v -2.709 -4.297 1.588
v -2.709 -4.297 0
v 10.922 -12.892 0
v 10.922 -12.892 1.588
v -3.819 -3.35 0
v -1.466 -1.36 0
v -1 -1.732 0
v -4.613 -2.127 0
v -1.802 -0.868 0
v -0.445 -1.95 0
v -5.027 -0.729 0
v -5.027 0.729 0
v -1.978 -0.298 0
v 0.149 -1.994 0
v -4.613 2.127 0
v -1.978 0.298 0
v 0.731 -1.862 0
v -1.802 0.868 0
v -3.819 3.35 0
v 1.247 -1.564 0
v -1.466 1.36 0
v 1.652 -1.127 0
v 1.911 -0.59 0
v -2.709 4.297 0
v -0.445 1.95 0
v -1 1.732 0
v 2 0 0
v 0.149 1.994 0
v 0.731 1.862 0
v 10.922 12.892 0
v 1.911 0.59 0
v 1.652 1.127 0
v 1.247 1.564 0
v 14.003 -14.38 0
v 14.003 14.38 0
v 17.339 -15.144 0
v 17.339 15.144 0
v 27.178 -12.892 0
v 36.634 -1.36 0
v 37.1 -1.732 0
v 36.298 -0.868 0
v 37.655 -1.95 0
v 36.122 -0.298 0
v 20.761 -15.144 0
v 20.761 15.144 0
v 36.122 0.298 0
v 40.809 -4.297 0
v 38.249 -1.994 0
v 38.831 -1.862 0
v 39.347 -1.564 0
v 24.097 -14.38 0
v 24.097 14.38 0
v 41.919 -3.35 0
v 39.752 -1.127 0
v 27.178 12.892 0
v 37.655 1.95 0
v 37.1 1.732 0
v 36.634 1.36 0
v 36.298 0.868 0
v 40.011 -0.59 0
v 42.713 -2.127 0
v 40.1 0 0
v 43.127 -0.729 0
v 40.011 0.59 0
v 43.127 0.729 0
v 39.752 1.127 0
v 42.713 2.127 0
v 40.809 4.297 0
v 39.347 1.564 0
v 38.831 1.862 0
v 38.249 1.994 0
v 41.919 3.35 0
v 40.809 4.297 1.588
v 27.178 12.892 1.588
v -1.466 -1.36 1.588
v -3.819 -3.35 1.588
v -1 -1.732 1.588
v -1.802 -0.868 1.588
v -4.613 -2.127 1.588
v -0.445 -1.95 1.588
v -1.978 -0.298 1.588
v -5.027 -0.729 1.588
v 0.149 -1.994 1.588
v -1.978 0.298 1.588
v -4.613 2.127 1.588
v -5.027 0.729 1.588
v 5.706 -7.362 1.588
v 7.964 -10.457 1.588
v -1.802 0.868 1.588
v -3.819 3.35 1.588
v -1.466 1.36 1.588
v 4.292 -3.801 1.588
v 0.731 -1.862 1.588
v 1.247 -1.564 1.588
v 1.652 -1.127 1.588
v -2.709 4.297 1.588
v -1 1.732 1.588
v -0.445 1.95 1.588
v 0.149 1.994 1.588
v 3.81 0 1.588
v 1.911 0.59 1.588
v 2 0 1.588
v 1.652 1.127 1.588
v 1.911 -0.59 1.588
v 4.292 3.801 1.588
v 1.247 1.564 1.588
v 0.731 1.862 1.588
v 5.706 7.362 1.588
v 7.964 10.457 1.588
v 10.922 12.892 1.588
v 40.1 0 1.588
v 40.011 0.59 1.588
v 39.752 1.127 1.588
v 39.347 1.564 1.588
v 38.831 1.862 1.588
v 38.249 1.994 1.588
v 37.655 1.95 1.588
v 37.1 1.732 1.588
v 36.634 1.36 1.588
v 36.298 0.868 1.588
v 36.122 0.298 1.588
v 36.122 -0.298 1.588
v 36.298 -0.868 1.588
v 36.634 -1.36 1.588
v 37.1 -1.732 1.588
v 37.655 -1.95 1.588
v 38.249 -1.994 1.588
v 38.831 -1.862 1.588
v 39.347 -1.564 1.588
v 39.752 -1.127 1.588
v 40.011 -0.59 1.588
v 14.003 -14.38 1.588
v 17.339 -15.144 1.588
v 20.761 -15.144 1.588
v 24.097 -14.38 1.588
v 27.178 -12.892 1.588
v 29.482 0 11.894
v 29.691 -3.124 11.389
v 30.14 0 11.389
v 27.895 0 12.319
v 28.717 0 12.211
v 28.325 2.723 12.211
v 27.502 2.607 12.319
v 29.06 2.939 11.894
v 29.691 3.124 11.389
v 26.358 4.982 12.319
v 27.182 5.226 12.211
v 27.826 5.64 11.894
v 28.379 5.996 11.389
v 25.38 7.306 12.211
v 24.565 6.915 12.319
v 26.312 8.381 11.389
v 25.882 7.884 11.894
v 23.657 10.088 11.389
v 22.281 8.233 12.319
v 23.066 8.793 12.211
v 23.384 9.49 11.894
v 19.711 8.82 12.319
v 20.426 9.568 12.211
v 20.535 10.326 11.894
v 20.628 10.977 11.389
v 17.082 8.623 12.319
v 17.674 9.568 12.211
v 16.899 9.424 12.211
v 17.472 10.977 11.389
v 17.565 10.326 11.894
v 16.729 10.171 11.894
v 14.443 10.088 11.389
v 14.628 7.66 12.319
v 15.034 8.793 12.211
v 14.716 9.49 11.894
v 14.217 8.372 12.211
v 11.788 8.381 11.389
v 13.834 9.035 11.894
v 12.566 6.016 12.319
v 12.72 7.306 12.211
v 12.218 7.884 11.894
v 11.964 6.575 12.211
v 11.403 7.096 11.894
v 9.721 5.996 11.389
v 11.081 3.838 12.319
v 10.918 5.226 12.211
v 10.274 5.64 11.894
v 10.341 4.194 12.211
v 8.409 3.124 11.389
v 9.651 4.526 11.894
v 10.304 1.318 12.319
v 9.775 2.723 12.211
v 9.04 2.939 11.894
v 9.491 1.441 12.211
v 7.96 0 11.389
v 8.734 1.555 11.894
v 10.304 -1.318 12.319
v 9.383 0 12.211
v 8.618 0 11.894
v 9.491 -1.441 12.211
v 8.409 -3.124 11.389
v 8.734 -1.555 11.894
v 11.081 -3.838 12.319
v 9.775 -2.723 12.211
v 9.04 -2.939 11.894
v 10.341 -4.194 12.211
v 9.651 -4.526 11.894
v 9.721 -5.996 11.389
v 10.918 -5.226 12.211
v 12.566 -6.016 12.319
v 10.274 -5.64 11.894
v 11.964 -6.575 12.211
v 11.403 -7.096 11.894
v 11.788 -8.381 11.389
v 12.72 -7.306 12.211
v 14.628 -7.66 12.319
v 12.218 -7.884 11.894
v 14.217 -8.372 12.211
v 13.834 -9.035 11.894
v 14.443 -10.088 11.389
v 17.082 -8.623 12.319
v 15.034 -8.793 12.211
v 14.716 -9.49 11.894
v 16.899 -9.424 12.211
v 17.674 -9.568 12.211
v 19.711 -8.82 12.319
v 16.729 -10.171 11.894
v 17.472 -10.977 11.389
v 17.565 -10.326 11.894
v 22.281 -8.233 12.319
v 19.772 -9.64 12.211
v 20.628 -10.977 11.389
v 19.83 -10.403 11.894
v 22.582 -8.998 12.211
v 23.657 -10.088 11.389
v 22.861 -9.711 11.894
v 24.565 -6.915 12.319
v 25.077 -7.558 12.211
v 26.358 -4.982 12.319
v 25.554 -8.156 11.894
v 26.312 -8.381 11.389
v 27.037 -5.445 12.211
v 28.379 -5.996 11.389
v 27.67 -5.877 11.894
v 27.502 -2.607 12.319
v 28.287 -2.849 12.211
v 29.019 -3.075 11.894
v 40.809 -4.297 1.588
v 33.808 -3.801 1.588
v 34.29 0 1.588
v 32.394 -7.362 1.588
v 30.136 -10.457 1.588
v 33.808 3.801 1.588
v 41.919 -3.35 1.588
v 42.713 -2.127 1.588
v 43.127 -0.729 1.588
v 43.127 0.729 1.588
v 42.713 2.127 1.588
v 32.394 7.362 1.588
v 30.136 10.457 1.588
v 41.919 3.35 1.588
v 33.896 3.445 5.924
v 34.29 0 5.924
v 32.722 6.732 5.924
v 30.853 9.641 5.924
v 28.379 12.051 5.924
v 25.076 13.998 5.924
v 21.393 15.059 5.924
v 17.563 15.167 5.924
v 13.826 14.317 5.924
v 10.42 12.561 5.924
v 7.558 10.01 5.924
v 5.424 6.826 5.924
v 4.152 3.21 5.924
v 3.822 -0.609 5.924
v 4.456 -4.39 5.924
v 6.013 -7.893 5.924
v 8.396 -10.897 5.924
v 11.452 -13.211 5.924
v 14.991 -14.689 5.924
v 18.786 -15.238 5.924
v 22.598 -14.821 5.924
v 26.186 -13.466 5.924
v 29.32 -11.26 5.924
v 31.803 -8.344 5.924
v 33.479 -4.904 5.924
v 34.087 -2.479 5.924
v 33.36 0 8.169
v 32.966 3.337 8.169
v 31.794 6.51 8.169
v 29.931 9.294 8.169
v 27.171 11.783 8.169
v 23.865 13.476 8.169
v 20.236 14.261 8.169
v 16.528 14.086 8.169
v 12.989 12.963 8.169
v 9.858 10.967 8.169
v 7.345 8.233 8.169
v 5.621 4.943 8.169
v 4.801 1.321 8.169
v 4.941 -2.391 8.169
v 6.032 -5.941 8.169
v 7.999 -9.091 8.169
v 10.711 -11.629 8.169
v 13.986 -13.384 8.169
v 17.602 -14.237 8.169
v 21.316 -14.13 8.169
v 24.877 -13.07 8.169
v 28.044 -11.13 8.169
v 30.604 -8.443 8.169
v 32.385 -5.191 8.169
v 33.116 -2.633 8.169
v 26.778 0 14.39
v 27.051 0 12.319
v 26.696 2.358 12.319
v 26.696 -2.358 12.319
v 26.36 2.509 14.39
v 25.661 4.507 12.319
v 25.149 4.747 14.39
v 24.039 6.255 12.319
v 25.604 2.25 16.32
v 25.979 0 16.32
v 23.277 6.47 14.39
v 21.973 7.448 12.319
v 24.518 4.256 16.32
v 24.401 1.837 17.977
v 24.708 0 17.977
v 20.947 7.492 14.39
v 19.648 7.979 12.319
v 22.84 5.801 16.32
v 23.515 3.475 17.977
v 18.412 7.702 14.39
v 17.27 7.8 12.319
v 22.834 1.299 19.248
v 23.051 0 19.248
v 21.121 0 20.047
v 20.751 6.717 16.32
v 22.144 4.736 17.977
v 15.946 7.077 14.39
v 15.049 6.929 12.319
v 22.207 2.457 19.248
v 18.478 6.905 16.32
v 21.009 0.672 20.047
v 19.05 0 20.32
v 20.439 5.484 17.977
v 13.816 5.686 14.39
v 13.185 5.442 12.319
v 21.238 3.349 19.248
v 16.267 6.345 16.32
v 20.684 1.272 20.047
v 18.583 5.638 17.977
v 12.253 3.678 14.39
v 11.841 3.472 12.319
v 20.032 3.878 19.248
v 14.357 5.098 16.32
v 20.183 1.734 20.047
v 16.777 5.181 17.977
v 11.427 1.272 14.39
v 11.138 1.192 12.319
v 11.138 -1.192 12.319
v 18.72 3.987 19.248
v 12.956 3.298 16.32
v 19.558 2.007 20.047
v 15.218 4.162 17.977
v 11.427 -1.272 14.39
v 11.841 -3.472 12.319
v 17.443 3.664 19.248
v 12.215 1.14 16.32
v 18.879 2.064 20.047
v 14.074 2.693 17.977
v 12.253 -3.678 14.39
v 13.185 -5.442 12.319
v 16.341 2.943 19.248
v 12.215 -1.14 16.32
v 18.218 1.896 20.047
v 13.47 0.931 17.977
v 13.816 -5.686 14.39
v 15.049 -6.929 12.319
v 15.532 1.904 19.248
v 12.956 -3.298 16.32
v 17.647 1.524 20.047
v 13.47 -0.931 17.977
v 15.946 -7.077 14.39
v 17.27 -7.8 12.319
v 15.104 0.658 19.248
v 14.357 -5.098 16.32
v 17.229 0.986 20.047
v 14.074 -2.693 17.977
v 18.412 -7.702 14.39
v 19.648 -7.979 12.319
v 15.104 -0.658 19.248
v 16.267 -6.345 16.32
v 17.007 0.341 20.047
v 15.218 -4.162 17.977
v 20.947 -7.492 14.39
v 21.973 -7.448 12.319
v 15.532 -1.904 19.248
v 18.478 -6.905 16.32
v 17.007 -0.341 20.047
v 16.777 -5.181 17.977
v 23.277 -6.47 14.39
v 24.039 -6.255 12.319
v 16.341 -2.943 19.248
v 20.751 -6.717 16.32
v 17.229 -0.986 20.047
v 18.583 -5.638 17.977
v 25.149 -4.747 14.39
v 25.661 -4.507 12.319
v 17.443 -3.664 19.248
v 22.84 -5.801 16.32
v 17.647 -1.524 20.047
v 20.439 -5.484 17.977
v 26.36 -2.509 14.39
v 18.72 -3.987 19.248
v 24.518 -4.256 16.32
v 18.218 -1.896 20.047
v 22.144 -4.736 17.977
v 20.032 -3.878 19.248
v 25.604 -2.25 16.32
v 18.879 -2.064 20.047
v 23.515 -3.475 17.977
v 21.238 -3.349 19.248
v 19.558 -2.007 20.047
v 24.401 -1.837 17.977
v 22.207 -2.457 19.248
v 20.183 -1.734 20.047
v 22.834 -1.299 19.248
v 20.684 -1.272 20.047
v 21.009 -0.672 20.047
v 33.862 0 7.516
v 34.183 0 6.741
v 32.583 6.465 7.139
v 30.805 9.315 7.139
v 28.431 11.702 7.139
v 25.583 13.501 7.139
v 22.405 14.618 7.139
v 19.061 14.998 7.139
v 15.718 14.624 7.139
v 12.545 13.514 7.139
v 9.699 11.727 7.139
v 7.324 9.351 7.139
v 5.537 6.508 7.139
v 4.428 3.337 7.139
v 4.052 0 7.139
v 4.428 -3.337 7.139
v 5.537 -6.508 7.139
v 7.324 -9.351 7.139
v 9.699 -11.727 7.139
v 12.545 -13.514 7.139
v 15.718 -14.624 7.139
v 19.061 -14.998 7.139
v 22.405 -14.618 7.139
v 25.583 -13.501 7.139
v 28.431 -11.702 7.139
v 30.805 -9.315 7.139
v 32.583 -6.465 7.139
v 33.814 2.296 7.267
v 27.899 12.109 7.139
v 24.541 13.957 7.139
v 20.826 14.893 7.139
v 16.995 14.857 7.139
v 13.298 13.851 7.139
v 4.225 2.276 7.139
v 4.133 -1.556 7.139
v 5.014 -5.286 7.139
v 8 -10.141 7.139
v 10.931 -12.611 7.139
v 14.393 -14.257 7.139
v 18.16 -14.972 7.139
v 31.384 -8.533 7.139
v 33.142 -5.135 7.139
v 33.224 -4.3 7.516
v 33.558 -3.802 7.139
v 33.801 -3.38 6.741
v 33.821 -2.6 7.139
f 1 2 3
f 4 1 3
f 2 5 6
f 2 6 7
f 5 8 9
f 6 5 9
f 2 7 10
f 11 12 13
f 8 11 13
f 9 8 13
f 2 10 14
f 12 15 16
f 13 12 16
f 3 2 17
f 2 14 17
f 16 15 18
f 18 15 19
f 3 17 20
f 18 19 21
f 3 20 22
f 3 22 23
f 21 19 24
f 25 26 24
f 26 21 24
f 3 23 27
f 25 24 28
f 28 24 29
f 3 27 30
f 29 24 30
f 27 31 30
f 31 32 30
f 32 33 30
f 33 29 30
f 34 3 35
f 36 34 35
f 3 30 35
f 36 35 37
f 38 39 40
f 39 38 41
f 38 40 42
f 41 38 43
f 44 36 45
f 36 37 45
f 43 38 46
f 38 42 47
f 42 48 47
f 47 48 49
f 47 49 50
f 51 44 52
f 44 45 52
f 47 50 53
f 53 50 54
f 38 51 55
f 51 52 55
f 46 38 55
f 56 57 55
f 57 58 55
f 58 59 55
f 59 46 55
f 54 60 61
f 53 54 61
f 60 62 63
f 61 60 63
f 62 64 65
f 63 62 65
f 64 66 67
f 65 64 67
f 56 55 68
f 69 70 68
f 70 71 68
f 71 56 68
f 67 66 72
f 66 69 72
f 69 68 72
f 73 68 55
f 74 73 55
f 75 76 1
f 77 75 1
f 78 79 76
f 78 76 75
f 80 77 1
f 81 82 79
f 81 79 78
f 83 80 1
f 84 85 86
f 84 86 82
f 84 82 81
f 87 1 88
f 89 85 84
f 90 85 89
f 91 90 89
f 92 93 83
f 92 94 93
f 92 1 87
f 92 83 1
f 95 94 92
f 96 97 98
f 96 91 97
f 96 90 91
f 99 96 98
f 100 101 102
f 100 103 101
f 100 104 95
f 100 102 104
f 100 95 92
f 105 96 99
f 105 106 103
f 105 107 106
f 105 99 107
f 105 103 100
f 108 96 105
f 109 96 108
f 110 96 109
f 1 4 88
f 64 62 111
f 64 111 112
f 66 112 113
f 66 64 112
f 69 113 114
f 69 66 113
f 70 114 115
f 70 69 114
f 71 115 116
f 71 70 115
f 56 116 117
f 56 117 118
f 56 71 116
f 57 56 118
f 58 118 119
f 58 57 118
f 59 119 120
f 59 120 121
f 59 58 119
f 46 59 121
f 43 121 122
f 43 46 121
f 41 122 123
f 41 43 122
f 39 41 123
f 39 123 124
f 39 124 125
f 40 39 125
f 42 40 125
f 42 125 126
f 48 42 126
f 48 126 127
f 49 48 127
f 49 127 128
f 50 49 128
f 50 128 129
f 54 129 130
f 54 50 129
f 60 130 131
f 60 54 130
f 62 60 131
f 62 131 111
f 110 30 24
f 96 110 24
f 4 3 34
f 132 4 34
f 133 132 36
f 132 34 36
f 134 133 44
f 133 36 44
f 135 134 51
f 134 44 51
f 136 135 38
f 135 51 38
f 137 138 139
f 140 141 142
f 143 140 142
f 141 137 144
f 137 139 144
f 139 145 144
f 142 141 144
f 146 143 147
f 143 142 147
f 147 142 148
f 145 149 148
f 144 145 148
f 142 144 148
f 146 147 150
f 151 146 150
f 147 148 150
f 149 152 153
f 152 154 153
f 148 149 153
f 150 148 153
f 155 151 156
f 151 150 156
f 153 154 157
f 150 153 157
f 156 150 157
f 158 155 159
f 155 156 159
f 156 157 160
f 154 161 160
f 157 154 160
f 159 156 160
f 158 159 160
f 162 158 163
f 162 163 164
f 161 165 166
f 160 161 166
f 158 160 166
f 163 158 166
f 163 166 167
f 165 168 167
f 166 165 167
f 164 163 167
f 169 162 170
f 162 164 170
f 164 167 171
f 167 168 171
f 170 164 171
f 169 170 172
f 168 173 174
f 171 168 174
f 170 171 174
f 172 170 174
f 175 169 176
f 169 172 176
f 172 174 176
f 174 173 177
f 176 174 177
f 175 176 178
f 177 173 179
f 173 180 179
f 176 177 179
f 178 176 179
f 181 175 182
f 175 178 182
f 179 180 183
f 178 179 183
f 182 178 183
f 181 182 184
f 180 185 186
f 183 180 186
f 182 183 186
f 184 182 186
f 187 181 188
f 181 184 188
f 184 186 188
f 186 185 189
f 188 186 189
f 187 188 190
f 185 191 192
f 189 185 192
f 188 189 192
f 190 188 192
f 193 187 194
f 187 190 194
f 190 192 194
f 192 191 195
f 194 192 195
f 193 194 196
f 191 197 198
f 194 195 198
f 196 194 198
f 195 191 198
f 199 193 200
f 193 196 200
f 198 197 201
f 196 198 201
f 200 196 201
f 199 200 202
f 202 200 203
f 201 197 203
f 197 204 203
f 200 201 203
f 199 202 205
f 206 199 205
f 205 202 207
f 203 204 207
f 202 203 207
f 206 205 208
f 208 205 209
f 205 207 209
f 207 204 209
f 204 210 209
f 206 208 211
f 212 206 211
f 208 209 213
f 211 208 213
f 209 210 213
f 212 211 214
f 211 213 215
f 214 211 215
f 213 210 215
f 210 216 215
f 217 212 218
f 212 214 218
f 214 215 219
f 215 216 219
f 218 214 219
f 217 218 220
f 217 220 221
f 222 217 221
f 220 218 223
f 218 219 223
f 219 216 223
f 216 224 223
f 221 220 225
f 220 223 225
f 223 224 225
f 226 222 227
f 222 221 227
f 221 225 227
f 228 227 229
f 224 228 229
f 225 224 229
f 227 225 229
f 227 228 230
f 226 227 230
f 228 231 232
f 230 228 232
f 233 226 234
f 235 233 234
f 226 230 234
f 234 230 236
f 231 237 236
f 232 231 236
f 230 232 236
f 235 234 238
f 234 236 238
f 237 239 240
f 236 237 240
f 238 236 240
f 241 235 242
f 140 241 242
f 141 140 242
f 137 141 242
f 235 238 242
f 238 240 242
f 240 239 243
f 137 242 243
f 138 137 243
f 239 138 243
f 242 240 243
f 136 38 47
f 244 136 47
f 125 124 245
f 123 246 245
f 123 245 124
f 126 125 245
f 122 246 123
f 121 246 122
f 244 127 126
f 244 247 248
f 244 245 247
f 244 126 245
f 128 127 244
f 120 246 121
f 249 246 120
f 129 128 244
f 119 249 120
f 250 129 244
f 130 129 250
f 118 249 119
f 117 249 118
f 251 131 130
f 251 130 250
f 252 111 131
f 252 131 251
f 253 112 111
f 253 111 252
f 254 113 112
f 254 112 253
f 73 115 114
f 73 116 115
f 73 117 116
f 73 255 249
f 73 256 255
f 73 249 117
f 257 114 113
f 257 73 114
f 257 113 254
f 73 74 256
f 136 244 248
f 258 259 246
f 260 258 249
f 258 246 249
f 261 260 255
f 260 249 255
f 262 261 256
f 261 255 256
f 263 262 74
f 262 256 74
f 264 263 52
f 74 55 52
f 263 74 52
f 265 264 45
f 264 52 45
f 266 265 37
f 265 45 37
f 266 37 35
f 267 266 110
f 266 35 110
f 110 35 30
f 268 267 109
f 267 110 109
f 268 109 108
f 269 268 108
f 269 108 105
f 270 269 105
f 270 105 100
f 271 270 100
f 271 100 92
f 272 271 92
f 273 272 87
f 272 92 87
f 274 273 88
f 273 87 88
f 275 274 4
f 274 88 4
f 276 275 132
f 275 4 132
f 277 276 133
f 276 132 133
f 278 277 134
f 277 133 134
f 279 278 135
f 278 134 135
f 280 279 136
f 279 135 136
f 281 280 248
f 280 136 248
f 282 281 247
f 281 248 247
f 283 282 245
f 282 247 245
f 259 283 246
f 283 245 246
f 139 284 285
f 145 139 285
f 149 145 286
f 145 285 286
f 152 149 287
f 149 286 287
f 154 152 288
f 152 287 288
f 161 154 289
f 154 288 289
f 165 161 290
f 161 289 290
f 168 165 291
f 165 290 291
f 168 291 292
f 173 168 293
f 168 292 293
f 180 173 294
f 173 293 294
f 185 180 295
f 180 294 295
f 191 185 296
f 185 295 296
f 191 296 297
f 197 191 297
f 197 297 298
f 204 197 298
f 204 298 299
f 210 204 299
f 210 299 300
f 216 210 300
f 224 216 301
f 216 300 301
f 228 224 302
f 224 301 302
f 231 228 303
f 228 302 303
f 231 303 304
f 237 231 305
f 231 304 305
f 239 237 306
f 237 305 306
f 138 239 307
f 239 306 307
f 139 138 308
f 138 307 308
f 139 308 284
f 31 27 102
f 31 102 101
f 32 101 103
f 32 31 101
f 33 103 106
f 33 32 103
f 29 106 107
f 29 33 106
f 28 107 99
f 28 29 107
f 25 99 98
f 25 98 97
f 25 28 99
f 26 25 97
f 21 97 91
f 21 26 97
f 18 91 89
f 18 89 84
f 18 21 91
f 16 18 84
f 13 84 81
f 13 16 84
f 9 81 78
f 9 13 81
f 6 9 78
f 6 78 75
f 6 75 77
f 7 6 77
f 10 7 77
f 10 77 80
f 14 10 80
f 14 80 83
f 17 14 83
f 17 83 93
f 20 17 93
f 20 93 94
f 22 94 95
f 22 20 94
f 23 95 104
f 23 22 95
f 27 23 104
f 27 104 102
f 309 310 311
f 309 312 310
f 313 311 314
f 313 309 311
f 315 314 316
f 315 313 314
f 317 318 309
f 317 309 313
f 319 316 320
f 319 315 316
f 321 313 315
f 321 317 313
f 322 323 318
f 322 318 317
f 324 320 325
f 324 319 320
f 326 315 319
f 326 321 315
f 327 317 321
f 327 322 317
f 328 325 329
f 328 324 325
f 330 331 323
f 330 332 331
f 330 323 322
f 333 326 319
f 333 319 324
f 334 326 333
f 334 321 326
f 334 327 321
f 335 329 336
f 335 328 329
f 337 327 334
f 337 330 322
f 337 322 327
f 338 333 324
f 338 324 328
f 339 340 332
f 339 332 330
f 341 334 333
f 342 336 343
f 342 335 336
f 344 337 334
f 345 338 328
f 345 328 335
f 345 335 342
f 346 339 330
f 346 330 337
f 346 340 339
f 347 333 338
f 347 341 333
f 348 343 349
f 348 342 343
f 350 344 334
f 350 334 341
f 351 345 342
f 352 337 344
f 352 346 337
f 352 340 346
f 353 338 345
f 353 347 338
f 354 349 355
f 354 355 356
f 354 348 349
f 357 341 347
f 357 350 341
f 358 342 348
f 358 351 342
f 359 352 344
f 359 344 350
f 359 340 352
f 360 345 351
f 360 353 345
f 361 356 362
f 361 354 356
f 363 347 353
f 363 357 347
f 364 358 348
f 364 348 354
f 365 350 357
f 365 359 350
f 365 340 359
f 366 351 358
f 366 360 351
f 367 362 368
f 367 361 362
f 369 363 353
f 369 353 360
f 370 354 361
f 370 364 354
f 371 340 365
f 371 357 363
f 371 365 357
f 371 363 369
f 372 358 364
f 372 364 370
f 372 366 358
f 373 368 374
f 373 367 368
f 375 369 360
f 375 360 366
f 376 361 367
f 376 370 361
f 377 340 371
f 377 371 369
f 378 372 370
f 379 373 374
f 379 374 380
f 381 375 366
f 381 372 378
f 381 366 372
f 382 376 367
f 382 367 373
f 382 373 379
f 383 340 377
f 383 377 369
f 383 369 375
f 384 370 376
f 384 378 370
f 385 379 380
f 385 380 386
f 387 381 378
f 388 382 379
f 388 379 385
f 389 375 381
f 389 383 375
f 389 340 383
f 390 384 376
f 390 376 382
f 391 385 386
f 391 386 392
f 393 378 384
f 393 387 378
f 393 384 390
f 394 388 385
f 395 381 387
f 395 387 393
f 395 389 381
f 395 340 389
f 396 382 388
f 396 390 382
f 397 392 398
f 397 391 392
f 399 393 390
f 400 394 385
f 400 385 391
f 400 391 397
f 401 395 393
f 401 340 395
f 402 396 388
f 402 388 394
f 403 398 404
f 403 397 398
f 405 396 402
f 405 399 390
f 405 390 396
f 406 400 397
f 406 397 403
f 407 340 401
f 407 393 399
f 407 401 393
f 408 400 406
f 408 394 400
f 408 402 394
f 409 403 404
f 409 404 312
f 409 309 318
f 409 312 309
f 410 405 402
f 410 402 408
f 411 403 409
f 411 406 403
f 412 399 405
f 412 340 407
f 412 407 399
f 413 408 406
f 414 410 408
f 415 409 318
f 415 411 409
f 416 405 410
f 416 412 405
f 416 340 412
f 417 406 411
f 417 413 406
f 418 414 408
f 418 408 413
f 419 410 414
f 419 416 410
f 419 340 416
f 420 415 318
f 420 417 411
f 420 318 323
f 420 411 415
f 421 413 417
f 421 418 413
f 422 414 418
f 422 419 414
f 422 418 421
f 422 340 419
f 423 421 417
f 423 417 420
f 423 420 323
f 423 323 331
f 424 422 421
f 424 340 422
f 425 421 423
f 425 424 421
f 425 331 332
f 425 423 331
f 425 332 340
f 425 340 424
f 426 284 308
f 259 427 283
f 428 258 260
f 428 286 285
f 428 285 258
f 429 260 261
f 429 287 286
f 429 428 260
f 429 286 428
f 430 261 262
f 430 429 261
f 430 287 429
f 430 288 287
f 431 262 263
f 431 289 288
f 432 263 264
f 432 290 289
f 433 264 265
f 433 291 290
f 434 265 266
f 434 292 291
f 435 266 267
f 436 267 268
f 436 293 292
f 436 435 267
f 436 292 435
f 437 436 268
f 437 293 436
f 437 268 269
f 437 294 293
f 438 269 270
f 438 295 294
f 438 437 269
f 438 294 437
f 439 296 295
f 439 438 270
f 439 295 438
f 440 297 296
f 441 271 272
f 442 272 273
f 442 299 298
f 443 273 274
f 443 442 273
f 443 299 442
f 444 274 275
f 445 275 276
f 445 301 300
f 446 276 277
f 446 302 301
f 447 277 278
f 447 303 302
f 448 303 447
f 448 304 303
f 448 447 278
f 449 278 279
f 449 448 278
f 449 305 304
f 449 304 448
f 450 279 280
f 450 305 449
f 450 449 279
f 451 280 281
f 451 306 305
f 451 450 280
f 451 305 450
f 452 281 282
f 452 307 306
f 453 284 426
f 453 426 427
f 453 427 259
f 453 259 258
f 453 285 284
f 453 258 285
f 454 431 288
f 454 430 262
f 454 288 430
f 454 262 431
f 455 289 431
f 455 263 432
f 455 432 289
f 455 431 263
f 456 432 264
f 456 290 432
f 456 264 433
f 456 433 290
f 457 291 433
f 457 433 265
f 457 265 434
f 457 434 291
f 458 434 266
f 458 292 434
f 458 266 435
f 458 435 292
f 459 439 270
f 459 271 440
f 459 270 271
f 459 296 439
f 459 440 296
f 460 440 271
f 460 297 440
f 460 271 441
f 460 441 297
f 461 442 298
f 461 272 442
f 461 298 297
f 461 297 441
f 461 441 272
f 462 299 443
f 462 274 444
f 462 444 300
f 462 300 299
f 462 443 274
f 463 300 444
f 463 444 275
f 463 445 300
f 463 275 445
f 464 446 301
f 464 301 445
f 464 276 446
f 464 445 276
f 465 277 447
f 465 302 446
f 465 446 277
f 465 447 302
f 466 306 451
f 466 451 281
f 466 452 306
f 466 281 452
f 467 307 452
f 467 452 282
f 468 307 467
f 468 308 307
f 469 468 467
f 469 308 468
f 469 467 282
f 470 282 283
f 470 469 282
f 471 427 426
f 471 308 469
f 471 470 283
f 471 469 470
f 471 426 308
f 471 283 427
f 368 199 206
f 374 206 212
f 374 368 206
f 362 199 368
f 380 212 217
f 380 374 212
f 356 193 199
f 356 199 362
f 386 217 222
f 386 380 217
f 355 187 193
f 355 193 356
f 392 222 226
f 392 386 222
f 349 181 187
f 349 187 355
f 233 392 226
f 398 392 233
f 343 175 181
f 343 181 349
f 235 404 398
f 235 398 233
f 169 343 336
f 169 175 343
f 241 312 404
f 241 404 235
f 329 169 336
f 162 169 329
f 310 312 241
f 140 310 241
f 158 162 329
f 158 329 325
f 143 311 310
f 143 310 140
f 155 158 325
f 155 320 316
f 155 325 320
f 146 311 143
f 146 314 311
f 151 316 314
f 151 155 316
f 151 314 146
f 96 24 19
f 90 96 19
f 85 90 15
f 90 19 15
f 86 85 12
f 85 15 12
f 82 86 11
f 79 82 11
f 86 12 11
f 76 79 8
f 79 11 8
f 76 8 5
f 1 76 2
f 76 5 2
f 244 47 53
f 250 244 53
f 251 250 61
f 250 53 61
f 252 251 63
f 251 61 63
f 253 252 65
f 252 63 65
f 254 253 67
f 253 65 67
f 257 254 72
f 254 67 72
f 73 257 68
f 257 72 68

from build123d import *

# Parameters (mm, degrees)
F0_R     = 2
F1_DEPTH = 1.5875
F2_R     = 15.24
F3_DEPTH = 10.7315
F4_R     = 8.001
F5_DEPTH = 8.001
F6_R     = 8.00099
F7_SIZE  = 5.08
F8_R     = 3.175


# Not quite as in the source:
# - a fillet or chamfer is up to 0.001 mm smaller than in the source, because OpenCascade refuses the exact size


with BuildPart() as f1:
    # F0 (on Top) → F1 (new body)
    with BuildSketch(Plane.XY):
        with BuildLine():
            Line((10.922, 12.8915947811), (-2.7093333333, 4.2971982604))
            ThreePointArc((-2.7093333333, 4.2971982604), (-5.08, 0), (-2.7093333333, -4.2971982604))
            Line((-2.7093333333, -4.2971982604), (10.922, -12.8915947811))
            ThreePointArc((10.922, -12.8915947811), (19.05, -15.24), (27.178, -12.8915947811))
            Line((27.178, -12.8915947811), (40.8093333333, -4.2971982604))
            ThreePointArc((40.8093333333, -4.2971982604), (43.18, 0), (40.8093333333, 4.2971982604))
            Line((40.8093333333, 4.2971982604), (27.178, 12.8915947811))
            ThreePointArc((27.178, 12.8915947811), (19.05, 15.24), (10.922, 12.8915947811))
        make_face()
        Circle(F0_R, mode=Mode.SUBTRACT)
        with Locations((38.1, 0)):
            Circle(F0_R, mode=Mode.SUBTRACT)
    extrude(amount=F1_DEPTH)

    # F2 (on face) → F3 (join)
    with BuildSketch(Plane.XY.offset(1.5875)):
        with Locations((19.05, 0)):
            Circle(F2_R)
    extrude(amount=F3_DEPTH)

    # F4 (on face) → F5 (join)
    with BuildSketch(Plane.XY.offset(12.319)):
        with Locations((19.05, 0)):
            Circle(F4_R)
    extrude(amount=F5_DEPTH)

    # F6 (radius 8.001 in the source; OpenCascade refuses exactly that, so slightly less here)
    f6_edges = [f1.edges().sort_by_distance(p)[0] for p in [
        (11.049, 0, 20.32),
    ]]
    fillet(f6_edges, radius=F6_R)

    # F7
    f7_edges = [f1.edges().sort_by_distance(p)[0] for p in [
        (3.81, 0, 12.319),
    ]]
    chamfer(f7_edges, length=F7_SIZE)

    # F8
    f8_edges = [f1.edges().sort_by_distance(p)[0] for p in [
        (3.81, 0, 7.239),
        (8.89, 0, 12.319),
    ]]
    fillet(f8_edges, radius=F8_R)


solid = f1.part
